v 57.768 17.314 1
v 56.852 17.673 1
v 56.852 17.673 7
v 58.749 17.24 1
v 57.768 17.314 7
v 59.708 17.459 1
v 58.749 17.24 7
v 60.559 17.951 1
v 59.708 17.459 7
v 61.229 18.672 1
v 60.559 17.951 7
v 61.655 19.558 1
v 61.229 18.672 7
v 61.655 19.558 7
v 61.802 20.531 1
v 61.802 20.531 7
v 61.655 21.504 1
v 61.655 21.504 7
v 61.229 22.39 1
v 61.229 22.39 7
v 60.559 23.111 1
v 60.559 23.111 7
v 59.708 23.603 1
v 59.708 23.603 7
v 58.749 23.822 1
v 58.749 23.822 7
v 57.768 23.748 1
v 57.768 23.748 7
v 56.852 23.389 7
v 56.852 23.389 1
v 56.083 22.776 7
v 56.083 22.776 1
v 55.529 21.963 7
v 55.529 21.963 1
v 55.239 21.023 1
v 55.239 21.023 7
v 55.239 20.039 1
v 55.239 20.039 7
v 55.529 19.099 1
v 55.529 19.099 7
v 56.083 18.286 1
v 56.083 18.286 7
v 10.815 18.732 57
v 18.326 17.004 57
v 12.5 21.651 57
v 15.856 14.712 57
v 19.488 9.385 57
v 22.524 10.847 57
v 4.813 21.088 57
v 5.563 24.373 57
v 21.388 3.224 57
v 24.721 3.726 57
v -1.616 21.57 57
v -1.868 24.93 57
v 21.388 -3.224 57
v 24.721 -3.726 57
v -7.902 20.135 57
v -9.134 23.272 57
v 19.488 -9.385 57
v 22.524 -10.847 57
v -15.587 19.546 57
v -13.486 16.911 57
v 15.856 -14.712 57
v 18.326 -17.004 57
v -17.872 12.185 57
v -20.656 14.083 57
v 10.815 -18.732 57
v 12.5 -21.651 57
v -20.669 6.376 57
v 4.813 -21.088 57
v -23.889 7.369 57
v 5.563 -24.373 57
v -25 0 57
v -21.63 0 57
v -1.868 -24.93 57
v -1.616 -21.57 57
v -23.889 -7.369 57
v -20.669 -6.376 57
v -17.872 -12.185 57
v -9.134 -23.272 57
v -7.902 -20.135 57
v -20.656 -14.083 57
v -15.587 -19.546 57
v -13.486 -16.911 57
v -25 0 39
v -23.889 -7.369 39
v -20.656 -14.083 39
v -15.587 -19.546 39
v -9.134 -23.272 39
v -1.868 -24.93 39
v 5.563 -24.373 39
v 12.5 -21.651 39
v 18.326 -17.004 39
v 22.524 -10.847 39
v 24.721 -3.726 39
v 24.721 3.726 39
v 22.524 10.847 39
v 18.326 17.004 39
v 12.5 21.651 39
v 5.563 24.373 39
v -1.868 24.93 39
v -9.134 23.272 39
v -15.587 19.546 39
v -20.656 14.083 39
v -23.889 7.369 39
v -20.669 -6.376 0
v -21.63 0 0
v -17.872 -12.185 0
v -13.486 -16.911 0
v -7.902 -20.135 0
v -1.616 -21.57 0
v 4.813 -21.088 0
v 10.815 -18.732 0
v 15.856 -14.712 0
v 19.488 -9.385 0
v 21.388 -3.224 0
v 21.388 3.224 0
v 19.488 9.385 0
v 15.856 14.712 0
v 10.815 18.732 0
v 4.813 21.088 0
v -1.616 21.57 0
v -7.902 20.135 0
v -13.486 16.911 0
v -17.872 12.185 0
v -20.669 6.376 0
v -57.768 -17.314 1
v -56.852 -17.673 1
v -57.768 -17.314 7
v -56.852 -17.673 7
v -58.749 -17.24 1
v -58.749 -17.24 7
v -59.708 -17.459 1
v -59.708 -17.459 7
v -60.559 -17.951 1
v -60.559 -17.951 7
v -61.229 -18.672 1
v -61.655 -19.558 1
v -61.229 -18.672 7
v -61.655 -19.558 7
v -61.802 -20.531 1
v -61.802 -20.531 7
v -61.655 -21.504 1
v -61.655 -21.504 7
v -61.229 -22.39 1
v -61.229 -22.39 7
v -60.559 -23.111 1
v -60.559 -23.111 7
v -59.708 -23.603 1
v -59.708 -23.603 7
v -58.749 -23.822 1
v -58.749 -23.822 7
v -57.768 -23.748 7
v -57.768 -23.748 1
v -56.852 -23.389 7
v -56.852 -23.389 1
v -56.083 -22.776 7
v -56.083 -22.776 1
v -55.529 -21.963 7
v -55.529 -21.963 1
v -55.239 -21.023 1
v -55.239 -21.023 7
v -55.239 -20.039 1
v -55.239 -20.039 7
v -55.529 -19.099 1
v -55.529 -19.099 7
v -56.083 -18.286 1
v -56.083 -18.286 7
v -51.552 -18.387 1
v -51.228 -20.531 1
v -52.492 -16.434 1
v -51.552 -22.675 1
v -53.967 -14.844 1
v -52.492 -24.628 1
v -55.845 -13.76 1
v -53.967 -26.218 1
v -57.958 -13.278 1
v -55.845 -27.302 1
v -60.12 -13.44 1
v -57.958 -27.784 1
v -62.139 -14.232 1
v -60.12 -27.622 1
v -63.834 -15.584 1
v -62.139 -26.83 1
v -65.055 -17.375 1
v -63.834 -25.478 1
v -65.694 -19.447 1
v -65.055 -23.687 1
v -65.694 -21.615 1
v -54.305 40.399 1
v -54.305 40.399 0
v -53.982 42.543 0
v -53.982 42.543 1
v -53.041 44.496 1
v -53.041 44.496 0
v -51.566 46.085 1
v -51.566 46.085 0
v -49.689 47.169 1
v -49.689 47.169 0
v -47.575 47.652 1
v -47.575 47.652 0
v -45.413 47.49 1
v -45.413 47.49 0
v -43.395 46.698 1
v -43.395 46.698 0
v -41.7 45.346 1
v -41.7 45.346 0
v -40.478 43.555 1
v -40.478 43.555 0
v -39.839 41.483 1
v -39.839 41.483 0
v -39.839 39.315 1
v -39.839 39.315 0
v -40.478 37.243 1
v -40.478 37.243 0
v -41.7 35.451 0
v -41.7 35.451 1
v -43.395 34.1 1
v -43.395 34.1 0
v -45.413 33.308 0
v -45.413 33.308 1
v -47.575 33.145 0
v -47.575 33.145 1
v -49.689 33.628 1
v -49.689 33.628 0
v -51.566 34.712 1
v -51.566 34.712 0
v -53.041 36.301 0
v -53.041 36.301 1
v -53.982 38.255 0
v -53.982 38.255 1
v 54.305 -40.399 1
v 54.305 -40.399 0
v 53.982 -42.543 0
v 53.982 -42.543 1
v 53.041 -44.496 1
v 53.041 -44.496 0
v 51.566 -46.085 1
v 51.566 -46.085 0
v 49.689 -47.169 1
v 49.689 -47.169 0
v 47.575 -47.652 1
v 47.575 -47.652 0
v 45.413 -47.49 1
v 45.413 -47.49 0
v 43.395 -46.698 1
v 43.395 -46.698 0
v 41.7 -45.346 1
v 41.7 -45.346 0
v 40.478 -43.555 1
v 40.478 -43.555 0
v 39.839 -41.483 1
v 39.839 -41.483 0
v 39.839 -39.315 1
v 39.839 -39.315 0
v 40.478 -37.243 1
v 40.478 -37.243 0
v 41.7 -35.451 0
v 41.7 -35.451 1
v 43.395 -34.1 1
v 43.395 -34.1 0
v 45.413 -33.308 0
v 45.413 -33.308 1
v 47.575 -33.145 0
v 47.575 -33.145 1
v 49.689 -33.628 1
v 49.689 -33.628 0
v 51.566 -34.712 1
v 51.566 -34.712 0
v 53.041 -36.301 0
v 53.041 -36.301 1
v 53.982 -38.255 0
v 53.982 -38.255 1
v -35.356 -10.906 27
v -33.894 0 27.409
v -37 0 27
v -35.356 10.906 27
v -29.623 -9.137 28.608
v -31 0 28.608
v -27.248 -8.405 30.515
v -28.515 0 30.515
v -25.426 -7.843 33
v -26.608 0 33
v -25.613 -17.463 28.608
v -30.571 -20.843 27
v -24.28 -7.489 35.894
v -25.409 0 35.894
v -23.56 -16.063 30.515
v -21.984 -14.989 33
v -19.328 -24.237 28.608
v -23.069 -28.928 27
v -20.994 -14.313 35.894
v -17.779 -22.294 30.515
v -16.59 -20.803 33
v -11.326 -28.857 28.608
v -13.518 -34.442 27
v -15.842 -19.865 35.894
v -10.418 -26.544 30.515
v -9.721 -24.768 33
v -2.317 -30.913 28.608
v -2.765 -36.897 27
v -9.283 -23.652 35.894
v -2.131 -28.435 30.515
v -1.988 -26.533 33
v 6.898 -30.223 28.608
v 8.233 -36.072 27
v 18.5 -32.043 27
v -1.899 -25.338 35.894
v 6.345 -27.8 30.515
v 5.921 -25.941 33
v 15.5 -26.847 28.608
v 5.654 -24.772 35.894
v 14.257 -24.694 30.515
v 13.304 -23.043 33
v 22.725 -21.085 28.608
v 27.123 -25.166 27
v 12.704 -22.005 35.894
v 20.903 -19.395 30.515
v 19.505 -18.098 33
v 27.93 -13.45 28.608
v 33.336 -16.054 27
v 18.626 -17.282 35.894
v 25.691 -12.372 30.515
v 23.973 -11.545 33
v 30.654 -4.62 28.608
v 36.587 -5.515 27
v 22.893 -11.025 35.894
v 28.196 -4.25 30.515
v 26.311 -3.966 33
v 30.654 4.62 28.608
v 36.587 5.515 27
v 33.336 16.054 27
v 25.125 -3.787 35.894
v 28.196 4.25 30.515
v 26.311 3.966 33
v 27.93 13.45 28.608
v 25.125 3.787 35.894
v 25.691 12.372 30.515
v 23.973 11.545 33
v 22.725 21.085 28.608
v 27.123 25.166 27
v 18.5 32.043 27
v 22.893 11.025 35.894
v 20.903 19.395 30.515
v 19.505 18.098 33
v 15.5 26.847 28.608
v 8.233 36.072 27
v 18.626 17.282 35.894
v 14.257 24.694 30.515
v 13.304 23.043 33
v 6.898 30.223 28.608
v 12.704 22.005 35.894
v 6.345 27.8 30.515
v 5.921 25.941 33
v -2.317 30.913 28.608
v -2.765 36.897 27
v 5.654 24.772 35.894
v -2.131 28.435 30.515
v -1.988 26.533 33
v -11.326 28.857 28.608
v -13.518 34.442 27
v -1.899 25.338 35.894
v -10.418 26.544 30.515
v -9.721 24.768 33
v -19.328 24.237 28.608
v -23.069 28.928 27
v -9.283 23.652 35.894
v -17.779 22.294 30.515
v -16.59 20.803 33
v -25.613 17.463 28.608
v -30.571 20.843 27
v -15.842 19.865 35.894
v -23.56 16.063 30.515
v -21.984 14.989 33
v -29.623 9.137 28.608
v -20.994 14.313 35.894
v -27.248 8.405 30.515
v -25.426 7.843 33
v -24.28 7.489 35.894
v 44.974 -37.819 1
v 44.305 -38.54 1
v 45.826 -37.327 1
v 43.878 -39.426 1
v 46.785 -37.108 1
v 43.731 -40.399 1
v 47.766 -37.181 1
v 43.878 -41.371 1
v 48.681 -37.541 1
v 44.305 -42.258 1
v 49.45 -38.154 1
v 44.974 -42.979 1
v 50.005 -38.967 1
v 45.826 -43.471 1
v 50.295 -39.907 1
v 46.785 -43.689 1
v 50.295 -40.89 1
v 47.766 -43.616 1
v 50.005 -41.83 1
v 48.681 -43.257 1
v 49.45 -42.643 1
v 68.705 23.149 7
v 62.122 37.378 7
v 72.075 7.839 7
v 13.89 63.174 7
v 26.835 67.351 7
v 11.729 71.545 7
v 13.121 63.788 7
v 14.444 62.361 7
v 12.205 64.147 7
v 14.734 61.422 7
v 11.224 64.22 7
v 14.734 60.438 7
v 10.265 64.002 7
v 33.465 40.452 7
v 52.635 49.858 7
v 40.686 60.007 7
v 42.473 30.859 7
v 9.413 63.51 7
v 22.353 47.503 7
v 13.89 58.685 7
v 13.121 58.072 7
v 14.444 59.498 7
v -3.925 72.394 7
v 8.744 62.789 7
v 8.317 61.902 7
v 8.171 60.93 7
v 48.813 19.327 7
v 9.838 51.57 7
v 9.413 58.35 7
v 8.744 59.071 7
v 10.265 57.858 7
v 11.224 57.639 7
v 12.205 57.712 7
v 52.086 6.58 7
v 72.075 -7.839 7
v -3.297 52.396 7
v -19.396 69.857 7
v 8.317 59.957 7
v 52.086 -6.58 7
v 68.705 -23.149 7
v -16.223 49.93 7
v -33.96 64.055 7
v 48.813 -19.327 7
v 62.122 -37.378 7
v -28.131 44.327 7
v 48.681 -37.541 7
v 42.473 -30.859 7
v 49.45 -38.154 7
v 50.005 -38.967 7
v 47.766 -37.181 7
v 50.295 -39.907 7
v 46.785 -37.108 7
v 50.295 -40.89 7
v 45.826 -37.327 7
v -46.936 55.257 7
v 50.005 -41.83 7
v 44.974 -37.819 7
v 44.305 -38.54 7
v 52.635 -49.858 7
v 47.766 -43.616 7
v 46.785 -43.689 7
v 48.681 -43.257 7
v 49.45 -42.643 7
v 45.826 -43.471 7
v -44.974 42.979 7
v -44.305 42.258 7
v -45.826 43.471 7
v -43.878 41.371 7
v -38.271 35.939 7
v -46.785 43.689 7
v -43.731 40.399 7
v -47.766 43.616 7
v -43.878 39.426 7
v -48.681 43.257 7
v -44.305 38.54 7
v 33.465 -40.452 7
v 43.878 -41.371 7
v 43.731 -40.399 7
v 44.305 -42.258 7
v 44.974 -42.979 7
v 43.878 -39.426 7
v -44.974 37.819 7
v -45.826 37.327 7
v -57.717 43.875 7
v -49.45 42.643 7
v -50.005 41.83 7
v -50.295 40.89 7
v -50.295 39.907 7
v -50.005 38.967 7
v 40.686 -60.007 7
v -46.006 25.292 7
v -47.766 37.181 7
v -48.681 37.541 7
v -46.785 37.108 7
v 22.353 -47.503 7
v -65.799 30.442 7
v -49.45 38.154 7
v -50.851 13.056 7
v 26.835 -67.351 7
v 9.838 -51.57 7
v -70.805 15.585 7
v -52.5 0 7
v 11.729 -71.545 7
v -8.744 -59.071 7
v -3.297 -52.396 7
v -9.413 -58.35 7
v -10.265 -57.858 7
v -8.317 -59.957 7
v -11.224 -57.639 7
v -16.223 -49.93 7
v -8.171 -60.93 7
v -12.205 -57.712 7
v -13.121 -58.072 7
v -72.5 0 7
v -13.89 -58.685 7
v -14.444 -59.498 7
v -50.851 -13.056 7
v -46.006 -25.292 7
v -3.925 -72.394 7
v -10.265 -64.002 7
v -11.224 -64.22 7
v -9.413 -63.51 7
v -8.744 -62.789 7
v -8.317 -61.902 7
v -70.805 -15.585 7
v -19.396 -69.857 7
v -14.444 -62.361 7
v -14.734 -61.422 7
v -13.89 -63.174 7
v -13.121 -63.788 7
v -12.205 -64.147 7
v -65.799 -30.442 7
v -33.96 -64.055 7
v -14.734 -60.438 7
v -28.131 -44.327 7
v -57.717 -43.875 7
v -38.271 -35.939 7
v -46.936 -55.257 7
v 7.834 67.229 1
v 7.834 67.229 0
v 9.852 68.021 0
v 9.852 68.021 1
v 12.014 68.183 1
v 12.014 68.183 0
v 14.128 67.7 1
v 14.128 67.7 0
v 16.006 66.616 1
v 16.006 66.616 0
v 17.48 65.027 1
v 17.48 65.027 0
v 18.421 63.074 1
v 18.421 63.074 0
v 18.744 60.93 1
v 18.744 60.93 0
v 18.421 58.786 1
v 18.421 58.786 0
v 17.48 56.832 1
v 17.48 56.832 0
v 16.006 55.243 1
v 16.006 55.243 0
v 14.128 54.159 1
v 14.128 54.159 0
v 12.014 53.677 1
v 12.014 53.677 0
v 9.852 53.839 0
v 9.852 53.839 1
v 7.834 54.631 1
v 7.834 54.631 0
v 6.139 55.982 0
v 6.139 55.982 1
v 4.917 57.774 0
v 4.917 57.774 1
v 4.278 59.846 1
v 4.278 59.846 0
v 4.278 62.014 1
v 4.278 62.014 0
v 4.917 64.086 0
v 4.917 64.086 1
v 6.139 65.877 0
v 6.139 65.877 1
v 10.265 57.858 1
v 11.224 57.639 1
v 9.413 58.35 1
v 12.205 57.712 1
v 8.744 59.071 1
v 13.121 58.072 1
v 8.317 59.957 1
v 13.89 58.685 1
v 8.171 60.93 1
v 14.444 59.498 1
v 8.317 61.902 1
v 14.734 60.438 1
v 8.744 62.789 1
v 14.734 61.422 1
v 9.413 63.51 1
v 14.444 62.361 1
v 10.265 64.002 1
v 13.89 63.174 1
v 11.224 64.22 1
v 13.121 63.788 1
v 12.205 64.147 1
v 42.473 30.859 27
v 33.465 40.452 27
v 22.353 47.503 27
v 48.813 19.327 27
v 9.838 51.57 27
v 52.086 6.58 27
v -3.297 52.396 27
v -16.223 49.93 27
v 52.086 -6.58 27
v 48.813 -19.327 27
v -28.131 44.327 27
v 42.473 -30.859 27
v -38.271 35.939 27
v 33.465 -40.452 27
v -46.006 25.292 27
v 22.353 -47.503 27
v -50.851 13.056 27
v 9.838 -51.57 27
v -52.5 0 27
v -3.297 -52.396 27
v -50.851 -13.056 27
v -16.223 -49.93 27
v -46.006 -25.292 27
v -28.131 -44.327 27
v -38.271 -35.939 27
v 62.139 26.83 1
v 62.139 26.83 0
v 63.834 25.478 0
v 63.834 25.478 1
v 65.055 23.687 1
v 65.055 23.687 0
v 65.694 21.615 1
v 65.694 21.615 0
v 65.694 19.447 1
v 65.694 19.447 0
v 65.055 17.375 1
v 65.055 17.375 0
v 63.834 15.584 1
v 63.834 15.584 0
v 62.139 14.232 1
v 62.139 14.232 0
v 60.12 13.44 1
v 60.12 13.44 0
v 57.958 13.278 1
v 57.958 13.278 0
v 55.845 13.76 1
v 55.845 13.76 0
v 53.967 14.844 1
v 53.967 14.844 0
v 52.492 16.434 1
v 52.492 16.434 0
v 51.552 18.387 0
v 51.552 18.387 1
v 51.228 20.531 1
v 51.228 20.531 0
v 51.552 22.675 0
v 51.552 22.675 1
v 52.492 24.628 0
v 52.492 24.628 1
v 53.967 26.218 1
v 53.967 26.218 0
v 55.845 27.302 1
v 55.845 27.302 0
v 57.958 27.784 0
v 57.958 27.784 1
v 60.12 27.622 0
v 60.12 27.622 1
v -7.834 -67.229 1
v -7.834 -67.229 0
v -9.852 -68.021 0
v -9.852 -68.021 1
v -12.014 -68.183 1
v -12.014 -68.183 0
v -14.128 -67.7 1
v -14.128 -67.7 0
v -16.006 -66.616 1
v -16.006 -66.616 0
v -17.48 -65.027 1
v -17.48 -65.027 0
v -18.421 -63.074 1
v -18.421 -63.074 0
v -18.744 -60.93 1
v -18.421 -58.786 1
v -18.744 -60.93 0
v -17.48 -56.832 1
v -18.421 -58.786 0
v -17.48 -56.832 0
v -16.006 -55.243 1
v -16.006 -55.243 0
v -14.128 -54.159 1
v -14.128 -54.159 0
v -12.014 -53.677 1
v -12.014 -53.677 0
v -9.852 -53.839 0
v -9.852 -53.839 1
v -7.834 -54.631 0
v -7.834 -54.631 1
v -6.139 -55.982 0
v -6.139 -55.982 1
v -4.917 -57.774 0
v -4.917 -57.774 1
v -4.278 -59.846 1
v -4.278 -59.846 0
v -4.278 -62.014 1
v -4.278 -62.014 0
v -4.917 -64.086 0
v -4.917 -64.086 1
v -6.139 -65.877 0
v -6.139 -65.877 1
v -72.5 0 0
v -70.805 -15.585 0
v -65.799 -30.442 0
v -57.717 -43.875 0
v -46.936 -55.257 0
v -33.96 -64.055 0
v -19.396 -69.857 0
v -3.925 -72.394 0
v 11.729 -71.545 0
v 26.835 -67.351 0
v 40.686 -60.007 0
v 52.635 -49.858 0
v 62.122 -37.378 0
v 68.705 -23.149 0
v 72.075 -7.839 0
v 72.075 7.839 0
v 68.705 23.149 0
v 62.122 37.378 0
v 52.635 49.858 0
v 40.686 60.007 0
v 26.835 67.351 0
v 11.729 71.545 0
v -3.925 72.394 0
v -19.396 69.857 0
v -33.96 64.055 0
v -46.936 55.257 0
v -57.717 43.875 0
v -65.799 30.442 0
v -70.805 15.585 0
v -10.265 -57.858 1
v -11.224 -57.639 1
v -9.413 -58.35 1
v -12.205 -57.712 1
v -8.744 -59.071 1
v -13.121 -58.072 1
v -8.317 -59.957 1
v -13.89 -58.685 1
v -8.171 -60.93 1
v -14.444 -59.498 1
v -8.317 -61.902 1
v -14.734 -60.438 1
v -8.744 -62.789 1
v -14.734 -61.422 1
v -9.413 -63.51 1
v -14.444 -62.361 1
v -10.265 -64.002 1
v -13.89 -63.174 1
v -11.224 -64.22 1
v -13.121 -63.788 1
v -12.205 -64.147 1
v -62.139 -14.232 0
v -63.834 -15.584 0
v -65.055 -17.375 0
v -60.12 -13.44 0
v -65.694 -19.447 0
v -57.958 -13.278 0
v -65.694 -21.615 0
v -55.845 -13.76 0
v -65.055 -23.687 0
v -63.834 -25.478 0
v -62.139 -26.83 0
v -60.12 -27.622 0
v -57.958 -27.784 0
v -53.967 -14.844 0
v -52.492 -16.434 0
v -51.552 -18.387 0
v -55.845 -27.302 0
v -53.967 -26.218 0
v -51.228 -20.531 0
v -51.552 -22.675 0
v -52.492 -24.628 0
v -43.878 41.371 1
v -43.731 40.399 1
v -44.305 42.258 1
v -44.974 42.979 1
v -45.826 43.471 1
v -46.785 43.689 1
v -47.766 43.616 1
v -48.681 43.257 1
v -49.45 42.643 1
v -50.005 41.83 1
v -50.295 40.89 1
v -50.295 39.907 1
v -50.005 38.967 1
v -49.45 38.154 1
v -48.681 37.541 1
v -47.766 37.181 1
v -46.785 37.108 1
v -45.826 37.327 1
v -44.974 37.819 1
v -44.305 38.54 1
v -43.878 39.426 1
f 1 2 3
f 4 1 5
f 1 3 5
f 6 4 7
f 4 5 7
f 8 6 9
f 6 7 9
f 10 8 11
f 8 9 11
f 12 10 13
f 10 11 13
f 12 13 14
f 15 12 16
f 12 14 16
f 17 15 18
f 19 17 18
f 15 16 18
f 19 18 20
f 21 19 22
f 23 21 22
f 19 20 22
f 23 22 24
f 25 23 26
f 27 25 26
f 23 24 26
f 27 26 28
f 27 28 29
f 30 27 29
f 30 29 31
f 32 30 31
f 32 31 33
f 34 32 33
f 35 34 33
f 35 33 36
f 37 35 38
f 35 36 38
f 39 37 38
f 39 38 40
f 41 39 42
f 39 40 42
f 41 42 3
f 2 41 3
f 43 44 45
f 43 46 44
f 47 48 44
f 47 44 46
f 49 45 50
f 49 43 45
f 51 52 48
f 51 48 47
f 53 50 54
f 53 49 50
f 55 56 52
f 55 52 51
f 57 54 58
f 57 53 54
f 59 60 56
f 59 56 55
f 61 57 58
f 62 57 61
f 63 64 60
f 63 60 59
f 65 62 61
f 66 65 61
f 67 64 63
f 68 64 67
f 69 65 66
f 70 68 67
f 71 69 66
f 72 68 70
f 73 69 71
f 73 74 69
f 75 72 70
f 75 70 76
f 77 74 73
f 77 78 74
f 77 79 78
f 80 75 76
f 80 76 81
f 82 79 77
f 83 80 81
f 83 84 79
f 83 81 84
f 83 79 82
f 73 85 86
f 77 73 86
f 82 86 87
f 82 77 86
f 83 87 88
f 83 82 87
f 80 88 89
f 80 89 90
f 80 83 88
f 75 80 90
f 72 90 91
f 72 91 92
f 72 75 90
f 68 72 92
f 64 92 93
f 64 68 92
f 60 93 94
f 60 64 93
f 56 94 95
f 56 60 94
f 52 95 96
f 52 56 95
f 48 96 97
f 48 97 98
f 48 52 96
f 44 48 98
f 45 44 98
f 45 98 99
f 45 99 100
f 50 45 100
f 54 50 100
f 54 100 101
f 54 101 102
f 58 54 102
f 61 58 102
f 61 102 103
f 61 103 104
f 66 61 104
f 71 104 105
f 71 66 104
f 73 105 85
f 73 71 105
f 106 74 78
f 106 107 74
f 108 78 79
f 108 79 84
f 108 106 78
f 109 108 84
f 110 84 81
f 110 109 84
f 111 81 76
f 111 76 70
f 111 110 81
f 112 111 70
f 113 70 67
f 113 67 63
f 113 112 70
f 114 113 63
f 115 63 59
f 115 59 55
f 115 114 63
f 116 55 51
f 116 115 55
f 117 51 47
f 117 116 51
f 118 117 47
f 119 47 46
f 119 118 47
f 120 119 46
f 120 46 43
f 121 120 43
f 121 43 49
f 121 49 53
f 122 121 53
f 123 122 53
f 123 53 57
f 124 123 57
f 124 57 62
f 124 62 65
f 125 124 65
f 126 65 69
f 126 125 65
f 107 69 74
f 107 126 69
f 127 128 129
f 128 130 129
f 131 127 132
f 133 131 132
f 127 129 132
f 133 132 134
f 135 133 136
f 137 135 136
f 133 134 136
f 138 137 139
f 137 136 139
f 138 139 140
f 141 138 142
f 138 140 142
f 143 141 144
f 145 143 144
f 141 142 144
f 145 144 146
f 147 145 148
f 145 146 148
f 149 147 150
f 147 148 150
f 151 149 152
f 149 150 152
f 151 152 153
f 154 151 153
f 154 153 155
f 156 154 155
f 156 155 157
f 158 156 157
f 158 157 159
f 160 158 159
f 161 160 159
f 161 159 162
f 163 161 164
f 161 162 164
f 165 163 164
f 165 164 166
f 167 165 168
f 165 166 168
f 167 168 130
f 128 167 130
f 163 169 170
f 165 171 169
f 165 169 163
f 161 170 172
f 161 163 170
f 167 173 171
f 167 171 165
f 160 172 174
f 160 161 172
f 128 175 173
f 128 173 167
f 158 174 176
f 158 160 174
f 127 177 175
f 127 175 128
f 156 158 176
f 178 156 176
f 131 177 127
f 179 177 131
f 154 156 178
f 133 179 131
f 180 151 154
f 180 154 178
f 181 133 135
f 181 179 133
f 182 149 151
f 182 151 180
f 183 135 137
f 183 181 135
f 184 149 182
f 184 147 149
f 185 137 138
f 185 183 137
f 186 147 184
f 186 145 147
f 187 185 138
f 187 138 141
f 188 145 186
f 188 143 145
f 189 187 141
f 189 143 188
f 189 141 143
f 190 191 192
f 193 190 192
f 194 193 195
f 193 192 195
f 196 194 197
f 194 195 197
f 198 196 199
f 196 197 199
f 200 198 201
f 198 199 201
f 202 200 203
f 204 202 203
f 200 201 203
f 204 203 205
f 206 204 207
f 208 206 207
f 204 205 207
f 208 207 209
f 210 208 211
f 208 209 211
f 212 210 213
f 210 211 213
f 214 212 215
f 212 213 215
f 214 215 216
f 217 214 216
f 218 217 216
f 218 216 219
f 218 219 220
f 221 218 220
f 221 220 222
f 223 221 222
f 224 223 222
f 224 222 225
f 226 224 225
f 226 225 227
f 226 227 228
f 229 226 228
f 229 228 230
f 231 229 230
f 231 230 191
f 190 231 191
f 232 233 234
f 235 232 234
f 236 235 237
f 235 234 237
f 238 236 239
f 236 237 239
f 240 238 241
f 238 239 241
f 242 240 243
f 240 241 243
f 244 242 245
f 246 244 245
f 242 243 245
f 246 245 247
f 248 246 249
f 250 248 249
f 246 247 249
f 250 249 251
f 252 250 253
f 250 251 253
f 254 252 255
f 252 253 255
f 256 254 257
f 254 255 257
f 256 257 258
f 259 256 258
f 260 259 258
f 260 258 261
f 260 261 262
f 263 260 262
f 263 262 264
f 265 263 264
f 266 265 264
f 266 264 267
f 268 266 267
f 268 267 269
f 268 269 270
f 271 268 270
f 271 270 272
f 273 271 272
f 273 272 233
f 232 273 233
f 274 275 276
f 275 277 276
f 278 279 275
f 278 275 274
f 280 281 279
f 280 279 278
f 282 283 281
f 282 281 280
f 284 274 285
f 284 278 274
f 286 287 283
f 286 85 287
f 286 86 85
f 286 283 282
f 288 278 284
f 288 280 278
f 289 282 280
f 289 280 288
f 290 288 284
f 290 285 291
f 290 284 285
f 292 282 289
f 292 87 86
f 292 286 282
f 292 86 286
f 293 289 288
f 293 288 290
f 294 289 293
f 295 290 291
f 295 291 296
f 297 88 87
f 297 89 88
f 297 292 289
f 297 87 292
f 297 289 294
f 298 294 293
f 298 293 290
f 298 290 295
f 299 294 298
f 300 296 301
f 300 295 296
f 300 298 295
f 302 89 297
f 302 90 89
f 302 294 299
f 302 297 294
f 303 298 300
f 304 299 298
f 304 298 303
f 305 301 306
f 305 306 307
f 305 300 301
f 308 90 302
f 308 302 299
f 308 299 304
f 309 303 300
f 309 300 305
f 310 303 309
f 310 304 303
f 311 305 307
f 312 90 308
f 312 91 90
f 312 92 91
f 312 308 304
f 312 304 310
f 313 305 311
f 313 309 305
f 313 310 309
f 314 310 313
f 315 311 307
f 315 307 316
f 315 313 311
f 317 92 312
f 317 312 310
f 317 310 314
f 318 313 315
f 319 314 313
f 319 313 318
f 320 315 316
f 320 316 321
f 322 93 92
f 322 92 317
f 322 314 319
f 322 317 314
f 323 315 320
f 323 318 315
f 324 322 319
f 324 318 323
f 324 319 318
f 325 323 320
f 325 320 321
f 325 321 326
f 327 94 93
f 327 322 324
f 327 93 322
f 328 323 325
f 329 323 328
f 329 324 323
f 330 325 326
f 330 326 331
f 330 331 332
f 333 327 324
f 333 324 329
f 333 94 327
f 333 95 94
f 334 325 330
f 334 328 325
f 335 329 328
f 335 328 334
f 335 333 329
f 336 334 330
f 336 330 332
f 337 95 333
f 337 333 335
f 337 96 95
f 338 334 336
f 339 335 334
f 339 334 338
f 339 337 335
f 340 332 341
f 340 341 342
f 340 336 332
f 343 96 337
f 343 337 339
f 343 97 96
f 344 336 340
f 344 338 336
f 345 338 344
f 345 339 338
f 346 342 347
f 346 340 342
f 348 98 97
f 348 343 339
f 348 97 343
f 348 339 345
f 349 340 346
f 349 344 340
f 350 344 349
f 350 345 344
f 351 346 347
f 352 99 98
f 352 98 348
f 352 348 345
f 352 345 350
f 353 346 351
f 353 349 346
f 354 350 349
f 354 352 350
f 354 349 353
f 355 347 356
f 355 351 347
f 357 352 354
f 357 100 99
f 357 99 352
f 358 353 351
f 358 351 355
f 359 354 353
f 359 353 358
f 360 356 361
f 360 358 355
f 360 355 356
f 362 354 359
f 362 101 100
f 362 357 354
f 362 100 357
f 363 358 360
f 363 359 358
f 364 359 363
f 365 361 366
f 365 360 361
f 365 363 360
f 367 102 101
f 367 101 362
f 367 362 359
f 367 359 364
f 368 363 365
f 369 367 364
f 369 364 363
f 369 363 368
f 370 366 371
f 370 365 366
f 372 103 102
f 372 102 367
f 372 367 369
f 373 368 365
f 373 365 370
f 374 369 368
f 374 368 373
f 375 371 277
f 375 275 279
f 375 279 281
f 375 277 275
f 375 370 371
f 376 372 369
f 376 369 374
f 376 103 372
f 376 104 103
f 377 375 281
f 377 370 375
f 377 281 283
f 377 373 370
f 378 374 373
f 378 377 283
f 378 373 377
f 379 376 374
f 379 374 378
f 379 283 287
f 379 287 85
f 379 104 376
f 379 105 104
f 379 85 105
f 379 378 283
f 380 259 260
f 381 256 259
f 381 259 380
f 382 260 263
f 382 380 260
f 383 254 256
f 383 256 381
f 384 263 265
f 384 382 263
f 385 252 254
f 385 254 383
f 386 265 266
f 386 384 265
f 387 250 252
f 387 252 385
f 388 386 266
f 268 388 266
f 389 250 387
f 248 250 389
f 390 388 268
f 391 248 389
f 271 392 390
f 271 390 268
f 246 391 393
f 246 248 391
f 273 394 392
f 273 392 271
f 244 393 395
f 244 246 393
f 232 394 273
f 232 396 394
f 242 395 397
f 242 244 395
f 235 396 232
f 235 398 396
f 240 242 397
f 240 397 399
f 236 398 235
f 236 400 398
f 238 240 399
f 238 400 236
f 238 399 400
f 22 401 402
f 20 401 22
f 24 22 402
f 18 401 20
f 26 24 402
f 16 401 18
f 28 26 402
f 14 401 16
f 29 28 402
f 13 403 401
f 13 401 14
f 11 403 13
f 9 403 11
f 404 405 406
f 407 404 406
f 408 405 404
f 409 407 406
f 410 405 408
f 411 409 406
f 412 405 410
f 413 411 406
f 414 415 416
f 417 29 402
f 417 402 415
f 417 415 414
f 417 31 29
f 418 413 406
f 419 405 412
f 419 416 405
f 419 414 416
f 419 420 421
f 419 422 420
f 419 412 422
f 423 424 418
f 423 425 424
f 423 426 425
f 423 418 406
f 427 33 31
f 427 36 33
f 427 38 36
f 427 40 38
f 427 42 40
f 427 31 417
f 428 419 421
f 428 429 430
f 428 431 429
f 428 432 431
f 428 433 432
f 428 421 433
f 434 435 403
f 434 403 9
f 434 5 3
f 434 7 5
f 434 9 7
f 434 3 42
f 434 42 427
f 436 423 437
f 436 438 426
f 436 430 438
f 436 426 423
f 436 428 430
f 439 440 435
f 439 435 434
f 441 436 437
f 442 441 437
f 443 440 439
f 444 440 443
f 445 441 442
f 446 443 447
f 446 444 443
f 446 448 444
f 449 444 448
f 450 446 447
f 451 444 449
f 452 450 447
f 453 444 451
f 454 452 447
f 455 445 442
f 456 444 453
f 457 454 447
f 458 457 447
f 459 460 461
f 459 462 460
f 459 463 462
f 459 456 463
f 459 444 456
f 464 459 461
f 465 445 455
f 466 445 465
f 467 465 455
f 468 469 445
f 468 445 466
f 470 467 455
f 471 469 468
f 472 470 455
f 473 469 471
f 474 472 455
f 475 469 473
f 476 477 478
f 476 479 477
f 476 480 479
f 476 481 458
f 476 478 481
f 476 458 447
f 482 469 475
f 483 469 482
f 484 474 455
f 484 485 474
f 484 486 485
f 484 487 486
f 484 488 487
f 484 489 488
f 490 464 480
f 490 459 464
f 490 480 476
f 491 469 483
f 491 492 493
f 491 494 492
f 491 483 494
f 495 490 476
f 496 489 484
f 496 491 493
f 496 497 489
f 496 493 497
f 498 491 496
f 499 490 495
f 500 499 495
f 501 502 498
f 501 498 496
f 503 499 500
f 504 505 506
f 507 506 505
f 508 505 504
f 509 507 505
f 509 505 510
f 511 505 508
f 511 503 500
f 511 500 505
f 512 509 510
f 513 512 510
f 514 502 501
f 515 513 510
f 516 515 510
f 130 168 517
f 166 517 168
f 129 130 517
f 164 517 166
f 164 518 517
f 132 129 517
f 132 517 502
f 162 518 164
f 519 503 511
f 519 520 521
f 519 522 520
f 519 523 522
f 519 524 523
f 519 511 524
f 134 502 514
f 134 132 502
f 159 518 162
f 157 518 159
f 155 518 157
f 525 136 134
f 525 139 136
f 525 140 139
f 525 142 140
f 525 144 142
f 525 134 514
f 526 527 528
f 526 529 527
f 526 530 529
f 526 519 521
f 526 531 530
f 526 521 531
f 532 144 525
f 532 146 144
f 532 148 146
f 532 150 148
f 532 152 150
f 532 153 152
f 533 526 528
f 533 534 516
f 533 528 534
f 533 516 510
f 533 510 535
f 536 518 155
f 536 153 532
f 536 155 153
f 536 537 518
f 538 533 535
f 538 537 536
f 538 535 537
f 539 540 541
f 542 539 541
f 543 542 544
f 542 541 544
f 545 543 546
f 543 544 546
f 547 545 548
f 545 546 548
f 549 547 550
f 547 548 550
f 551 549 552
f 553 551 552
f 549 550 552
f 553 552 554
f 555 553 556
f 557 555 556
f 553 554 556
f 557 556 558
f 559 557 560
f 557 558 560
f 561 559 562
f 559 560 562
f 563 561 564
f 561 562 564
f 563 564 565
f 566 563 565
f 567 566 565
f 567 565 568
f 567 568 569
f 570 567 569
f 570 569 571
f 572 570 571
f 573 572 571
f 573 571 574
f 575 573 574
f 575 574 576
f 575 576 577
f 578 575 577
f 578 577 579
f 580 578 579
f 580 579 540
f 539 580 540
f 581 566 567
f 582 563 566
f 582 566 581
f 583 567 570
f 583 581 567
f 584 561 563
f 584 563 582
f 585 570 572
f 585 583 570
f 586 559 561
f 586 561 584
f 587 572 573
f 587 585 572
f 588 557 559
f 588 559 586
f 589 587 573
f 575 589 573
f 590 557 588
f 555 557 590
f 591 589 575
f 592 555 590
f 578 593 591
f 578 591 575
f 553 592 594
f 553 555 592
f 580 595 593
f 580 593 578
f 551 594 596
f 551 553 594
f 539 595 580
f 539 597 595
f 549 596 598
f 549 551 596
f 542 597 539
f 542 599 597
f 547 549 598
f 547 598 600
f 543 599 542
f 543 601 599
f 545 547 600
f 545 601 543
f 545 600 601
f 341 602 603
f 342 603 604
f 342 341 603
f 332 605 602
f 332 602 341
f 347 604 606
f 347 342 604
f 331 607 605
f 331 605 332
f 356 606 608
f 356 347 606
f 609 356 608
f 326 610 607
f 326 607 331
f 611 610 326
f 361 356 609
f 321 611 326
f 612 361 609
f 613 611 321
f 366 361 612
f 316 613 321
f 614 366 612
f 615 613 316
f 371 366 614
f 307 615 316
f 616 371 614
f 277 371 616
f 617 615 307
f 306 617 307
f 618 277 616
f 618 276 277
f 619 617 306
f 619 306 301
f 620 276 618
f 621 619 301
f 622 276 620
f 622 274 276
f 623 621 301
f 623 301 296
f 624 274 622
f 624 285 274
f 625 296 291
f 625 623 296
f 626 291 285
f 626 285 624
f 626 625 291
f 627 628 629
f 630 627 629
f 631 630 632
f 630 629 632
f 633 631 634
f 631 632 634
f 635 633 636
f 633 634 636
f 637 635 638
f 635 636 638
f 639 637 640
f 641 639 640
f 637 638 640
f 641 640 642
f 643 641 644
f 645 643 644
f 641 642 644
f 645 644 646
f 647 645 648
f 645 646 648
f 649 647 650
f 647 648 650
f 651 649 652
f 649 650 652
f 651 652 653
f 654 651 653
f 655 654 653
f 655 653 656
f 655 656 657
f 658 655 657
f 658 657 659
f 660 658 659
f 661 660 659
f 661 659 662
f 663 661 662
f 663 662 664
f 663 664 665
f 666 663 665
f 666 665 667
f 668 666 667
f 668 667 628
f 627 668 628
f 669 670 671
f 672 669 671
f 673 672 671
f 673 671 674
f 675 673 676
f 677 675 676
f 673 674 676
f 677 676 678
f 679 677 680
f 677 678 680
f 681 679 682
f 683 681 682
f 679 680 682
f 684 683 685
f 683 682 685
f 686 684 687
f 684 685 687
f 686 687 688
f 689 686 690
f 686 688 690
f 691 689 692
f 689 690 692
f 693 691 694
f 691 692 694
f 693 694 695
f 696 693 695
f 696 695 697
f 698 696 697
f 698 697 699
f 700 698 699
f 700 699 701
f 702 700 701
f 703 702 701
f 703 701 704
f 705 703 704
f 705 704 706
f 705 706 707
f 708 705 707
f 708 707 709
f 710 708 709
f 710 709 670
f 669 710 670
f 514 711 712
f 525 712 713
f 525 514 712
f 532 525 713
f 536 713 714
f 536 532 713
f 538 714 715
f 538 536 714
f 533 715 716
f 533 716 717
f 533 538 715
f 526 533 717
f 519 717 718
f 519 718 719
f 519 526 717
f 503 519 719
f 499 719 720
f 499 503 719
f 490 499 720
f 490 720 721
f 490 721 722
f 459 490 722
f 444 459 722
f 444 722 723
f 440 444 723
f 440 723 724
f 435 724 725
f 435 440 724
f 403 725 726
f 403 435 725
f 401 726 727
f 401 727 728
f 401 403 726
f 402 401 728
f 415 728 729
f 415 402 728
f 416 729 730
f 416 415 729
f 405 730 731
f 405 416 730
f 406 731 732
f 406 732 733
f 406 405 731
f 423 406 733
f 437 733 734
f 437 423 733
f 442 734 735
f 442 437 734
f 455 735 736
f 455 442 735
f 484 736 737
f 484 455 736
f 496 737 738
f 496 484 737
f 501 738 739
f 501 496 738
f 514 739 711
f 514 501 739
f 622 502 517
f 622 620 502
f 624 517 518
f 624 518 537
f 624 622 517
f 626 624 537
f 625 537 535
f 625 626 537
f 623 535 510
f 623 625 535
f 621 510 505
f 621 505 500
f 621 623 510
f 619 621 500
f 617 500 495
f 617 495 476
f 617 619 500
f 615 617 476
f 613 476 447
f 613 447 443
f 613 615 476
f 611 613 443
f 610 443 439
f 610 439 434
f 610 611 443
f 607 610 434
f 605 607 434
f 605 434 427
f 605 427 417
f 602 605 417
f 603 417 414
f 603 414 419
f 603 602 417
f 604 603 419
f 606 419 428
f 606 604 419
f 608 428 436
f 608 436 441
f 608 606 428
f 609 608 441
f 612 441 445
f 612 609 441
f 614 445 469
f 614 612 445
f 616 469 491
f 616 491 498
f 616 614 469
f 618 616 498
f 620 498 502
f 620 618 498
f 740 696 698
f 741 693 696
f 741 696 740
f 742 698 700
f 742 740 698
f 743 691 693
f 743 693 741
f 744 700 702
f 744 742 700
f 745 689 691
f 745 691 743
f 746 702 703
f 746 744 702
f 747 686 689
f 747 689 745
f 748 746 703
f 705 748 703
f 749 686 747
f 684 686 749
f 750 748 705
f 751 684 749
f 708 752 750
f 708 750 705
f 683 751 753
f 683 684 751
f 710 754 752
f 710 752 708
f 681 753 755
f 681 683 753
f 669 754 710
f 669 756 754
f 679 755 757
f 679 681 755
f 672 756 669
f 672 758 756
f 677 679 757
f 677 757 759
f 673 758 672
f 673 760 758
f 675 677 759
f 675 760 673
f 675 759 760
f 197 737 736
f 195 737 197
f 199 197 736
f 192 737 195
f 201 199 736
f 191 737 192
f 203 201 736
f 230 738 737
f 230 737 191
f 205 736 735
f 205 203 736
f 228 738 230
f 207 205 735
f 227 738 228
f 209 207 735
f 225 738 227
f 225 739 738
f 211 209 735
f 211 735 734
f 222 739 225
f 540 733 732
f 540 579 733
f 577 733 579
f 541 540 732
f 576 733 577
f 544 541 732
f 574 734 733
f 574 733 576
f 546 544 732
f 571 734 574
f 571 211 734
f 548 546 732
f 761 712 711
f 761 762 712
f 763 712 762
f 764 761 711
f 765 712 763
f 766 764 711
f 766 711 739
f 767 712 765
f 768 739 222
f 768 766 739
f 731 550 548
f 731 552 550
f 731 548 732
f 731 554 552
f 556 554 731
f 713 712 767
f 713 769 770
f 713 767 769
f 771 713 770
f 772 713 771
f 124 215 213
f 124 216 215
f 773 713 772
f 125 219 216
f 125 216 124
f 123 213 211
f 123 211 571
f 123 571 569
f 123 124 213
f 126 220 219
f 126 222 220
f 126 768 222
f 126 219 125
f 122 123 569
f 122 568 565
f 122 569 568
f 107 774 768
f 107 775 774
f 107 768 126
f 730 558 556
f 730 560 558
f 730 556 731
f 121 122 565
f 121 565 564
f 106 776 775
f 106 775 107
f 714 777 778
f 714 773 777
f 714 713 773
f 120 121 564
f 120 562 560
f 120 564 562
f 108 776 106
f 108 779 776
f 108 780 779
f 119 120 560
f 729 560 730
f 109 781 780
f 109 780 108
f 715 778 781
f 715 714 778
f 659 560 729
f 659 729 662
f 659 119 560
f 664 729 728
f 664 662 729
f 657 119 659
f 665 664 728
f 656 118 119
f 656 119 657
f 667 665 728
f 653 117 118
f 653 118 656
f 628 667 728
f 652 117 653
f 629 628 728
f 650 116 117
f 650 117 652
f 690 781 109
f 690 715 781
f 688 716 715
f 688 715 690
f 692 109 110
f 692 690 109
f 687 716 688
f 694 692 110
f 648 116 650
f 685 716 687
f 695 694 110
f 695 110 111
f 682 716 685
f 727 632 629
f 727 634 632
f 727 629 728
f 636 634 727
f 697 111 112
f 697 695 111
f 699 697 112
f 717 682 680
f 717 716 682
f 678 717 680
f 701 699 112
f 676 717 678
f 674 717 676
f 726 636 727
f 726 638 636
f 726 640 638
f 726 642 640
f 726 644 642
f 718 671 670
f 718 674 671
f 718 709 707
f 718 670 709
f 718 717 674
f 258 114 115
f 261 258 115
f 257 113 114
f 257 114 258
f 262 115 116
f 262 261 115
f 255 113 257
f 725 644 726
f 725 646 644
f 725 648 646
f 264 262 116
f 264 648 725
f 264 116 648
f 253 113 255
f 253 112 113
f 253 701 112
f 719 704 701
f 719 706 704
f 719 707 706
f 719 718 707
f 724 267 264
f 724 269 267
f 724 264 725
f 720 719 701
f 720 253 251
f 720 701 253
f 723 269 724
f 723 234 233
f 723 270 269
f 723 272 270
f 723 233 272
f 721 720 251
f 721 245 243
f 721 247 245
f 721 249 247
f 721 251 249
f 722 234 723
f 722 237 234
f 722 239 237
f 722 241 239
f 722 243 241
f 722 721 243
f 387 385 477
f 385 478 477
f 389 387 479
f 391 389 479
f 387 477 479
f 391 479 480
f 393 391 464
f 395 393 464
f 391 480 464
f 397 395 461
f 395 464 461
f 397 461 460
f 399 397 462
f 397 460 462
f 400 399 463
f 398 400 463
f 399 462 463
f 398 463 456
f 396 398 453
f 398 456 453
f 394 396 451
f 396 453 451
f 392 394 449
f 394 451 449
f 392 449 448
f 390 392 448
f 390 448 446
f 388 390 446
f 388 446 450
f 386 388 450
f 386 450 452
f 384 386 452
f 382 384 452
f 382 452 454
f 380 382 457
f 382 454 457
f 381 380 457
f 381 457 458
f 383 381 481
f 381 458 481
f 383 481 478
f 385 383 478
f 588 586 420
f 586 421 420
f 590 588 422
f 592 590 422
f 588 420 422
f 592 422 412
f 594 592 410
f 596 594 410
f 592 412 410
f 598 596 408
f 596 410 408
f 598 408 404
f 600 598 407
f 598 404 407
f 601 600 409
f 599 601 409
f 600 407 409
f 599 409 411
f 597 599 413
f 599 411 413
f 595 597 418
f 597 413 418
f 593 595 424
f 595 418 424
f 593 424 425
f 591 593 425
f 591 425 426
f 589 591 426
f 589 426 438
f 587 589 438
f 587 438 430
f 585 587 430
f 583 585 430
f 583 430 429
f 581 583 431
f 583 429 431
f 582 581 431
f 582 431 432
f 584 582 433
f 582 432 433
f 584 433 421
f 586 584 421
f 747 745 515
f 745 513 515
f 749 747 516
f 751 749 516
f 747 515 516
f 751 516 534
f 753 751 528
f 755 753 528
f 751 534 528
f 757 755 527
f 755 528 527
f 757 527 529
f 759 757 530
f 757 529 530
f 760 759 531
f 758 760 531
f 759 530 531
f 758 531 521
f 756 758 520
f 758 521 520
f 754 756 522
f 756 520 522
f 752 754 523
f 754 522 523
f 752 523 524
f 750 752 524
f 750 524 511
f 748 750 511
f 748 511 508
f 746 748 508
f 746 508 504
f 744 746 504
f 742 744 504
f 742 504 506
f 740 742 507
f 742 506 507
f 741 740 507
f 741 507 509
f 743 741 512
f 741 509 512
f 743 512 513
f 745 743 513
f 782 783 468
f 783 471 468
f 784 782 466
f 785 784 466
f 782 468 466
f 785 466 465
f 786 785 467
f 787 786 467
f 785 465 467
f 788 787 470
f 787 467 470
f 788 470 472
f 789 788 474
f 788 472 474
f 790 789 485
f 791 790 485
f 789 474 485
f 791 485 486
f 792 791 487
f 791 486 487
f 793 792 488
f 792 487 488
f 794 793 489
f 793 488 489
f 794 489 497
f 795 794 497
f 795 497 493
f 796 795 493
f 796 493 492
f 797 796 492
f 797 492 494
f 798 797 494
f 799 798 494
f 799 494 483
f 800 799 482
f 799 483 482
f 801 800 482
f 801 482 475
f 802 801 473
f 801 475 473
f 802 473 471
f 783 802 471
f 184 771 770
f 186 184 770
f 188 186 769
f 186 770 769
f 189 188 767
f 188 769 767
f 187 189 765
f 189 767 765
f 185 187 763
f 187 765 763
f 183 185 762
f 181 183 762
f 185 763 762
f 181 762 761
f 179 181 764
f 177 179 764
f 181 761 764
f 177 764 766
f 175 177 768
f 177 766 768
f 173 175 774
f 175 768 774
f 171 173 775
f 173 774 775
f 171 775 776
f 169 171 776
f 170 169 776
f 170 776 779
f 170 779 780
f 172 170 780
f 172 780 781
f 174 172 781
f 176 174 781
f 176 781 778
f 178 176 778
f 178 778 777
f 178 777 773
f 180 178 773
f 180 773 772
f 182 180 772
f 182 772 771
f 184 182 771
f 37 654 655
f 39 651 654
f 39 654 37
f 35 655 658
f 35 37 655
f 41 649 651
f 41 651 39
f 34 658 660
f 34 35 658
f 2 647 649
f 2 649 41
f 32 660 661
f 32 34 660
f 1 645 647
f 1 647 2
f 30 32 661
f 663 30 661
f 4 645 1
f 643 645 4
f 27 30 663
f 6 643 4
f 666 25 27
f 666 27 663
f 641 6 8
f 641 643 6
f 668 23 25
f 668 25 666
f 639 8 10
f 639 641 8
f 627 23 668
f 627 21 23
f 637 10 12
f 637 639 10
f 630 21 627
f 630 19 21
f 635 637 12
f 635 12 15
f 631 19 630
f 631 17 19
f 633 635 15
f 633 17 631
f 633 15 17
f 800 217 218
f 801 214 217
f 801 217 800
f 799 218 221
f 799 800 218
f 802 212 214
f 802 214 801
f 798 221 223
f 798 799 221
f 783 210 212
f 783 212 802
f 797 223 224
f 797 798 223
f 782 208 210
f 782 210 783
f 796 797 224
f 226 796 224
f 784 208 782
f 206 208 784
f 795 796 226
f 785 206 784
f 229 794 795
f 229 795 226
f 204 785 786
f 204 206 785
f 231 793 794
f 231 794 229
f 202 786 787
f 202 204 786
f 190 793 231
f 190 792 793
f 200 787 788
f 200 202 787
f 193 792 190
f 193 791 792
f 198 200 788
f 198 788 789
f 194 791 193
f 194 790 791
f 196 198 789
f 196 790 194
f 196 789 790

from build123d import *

# Parameters (mm, degrees)
FILLET1_R                               = 12
CBORE_FOR_M6_HEX_HEAD_BOLT1_D           = 6.6
CBORE_FOR_M6_HEX_HEAD_BOLT1_CBORE_D     = 14.547
CBORE_FOR_M6_HEX_HEAD_BOLT1_CBORE_DEPTH = 1
CIRPATTERN1_COUNT                       = 6


with BuildPart() as part:
    # Sketch2 → Revolve1 (revolve)
    with BuildSketch(Plane(origin=(0, 0, 0), x_dir=(1, 0, 0), z_dir=(0, 1, 0))):
        Polygon((-72.5, 0), (-72.5, -7), (-52.5, -7), (-52.5, -27), (-25, -27), (-25, -57), (-21.63, -57), (-21.63, 0), align=None)
    revolve(axis=Axis((0, 0, 0), (0, 0, 1)))

    # Fillet1
    fillet1_edges = [part.edges().sort_by_distance(p)[0] for p in [
        (25, 0, 27),
    ]]
    fillet(fillet1_edges, radius=FILLET1_R)

    # CBORE for M6 Hex Head Bolt1 (through all)
    with Locations(Plane(origin=(-47.031359199, 40.398654085, 0), x_dir=(-1, 0, 0), z_dir=(0, 0, -1))):
        with Locations((0, 0)):
            cbore_for_m6_hex_head_bolt1 = CounterBoreHole(CBORE_FOR_M6_HEX_HEAD_BOLT1_D / 2, CBORE_FOR_M6_HEX_HEAD_BOLT1_CBORE_D / 2, CBORE_FOR_M6_HEX_HEAD_BOLT1_CBORE_DEPTH)

    # CirPattern1: CBORE for M6 Hex Head Bolt1 ×6 about axis
    cirpattern1_axis = Axis((0, 0, 0), (0, 0, 1))
    for i in range(1, CIRPATTERN1_COUNT):
        add(cbore_for_m6_hex_head_bolt1.rotate(cirpattern1_axis, i * 360 / CIRPATTERN1_COUNT), mode=Mode.SUBTRACT)


solid = part.part
